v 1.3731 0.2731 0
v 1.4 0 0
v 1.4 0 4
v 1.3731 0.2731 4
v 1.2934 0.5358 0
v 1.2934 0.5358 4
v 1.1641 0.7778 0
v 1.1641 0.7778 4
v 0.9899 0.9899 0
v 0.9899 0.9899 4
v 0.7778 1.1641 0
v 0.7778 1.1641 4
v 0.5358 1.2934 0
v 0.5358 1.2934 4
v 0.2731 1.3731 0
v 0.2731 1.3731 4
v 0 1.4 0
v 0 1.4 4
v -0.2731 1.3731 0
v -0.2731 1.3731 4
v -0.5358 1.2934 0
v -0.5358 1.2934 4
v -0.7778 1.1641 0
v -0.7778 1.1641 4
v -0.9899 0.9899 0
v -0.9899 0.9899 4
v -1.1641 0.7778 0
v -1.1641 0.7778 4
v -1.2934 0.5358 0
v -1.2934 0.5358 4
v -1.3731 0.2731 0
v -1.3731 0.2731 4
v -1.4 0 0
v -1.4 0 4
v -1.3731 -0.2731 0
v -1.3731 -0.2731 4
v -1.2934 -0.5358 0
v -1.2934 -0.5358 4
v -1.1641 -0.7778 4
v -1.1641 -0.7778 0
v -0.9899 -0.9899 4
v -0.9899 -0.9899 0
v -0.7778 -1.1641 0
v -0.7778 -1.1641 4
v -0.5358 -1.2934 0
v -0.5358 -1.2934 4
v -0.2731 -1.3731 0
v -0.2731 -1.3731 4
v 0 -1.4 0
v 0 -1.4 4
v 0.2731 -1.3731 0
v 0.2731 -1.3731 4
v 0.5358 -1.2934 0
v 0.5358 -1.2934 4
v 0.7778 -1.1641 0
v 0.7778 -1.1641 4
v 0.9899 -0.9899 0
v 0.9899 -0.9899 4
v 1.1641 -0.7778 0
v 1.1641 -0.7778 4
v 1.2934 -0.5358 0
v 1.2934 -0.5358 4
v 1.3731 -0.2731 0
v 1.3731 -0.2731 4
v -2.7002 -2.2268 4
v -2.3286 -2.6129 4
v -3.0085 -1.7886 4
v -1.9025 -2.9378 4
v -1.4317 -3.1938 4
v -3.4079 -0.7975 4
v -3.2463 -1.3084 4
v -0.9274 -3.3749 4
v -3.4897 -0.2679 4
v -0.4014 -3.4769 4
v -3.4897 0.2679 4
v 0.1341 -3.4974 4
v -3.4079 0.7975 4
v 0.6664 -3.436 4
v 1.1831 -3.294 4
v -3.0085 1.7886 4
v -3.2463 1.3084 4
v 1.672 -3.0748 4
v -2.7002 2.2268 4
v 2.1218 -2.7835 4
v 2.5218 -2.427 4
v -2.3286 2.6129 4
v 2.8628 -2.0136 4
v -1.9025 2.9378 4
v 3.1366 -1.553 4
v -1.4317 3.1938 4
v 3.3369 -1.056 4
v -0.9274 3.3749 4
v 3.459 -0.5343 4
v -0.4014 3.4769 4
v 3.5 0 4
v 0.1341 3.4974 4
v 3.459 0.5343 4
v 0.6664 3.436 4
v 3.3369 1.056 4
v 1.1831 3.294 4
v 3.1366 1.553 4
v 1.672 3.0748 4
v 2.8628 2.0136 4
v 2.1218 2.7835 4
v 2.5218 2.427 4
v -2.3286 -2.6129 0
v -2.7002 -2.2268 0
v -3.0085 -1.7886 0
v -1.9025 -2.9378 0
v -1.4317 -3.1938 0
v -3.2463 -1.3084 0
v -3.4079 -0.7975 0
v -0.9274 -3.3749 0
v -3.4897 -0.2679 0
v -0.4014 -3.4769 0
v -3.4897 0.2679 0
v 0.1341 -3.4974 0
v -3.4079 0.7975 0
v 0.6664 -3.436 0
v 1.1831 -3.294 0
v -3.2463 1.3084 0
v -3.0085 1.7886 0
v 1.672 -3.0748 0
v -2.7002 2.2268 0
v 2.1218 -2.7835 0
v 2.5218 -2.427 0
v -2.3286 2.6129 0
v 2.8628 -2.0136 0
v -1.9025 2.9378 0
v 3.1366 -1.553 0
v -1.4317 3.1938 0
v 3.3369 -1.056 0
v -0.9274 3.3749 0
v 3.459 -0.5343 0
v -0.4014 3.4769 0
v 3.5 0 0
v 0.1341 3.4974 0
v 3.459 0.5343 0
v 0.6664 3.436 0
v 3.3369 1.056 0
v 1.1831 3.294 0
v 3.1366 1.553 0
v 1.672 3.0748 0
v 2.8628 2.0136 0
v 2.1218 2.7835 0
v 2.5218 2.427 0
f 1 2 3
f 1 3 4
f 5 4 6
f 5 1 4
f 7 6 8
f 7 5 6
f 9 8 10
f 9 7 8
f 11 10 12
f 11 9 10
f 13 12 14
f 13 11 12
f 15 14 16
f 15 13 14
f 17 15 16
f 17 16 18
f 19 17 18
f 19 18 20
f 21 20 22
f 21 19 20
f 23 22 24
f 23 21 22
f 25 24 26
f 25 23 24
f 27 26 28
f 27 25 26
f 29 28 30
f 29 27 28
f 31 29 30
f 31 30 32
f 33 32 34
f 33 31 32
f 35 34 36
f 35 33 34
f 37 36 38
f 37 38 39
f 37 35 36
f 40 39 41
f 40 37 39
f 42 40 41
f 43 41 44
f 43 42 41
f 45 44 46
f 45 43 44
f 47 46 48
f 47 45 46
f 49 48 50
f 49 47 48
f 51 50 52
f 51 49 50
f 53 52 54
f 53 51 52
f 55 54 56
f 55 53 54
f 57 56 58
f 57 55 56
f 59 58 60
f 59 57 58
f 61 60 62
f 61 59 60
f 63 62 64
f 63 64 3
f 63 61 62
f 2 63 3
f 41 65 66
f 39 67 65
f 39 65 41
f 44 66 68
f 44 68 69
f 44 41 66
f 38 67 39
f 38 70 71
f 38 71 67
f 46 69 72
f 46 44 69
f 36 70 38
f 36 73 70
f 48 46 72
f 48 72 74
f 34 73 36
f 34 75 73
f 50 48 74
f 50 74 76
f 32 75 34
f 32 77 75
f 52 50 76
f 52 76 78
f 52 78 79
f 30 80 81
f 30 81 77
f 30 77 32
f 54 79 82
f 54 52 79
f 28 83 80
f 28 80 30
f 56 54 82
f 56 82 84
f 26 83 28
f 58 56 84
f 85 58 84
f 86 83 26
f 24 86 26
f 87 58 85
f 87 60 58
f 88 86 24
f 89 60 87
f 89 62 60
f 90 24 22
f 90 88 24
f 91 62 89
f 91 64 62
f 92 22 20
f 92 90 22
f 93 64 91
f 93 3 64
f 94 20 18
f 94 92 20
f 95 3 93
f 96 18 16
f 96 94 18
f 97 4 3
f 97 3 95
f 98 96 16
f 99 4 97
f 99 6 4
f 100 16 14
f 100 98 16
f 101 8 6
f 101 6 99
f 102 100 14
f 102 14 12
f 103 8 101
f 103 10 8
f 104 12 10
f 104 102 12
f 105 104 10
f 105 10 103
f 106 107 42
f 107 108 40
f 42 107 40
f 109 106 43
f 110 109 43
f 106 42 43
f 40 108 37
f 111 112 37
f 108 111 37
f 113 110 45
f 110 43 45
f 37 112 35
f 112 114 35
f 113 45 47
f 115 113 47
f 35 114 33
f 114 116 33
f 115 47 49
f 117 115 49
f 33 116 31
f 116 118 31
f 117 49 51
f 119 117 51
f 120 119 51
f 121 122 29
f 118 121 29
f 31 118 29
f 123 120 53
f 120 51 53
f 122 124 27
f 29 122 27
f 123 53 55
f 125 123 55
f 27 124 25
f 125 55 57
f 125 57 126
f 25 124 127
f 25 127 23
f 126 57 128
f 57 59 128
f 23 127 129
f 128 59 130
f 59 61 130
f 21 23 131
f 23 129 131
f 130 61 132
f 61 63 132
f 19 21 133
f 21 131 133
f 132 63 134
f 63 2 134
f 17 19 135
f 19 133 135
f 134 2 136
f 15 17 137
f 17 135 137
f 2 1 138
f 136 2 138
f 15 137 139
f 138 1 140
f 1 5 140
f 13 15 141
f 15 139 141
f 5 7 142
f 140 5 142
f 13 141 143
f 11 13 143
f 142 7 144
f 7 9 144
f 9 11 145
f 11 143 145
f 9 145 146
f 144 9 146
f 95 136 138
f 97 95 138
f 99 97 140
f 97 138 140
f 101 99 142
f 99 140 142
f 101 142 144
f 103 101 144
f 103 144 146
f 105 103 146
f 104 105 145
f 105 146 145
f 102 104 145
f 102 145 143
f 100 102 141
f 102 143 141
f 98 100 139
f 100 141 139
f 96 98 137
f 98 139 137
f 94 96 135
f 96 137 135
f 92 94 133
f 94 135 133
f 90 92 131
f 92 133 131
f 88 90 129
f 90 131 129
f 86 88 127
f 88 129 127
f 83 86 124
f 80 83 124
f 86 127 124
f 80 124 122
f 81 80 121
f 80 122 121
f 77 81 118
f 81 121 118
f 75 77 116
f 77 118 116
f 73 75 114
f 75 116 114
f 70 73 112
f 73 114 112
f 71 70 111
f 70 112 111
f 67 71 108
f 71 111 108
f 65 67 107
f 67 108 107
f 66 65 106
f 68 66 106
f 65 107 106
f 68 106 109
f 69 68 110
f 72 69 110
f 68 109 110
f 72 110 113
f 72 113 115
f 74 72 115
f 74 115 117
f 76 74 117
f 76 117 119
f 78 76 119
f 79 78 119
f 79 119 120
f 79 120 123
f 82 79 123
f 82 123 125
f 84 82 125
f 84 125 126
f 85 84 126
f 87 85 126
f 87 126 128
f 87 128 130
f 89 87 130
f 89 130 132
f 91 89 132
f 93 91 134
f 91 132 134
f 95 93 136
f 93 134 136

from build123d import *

# Parameters (mm, degrees)
CYLINDER014_R     = 1.4
CYLINDER014_DEPTH = 4
CYLINDER015_R     = 3.5
CYLINDER015_DEPTH = 4


with BuildPart() as cylinder014:
    # Cylinder014 → Cylinder014 (new body)
    with BuildSketch(Plane.XY):
        Circle(CYLINDER014_R)
    extrude(amount=CYLINDER014_DEPTH)


with BuildPart() as m2p5_spacer:
    # Cylinder015 → Cylinder015 (new body)
    with BuildSketch(Plane.XY):
        Circle(CYLINDER015_R)
    extrude(amount=CYLINDER015_DEPTH)

    # Cut011: cut Cylinder014
    add(cylinder014.part, mode=Mode.SUBTRACT)


solid = m2p5_spacer.part
